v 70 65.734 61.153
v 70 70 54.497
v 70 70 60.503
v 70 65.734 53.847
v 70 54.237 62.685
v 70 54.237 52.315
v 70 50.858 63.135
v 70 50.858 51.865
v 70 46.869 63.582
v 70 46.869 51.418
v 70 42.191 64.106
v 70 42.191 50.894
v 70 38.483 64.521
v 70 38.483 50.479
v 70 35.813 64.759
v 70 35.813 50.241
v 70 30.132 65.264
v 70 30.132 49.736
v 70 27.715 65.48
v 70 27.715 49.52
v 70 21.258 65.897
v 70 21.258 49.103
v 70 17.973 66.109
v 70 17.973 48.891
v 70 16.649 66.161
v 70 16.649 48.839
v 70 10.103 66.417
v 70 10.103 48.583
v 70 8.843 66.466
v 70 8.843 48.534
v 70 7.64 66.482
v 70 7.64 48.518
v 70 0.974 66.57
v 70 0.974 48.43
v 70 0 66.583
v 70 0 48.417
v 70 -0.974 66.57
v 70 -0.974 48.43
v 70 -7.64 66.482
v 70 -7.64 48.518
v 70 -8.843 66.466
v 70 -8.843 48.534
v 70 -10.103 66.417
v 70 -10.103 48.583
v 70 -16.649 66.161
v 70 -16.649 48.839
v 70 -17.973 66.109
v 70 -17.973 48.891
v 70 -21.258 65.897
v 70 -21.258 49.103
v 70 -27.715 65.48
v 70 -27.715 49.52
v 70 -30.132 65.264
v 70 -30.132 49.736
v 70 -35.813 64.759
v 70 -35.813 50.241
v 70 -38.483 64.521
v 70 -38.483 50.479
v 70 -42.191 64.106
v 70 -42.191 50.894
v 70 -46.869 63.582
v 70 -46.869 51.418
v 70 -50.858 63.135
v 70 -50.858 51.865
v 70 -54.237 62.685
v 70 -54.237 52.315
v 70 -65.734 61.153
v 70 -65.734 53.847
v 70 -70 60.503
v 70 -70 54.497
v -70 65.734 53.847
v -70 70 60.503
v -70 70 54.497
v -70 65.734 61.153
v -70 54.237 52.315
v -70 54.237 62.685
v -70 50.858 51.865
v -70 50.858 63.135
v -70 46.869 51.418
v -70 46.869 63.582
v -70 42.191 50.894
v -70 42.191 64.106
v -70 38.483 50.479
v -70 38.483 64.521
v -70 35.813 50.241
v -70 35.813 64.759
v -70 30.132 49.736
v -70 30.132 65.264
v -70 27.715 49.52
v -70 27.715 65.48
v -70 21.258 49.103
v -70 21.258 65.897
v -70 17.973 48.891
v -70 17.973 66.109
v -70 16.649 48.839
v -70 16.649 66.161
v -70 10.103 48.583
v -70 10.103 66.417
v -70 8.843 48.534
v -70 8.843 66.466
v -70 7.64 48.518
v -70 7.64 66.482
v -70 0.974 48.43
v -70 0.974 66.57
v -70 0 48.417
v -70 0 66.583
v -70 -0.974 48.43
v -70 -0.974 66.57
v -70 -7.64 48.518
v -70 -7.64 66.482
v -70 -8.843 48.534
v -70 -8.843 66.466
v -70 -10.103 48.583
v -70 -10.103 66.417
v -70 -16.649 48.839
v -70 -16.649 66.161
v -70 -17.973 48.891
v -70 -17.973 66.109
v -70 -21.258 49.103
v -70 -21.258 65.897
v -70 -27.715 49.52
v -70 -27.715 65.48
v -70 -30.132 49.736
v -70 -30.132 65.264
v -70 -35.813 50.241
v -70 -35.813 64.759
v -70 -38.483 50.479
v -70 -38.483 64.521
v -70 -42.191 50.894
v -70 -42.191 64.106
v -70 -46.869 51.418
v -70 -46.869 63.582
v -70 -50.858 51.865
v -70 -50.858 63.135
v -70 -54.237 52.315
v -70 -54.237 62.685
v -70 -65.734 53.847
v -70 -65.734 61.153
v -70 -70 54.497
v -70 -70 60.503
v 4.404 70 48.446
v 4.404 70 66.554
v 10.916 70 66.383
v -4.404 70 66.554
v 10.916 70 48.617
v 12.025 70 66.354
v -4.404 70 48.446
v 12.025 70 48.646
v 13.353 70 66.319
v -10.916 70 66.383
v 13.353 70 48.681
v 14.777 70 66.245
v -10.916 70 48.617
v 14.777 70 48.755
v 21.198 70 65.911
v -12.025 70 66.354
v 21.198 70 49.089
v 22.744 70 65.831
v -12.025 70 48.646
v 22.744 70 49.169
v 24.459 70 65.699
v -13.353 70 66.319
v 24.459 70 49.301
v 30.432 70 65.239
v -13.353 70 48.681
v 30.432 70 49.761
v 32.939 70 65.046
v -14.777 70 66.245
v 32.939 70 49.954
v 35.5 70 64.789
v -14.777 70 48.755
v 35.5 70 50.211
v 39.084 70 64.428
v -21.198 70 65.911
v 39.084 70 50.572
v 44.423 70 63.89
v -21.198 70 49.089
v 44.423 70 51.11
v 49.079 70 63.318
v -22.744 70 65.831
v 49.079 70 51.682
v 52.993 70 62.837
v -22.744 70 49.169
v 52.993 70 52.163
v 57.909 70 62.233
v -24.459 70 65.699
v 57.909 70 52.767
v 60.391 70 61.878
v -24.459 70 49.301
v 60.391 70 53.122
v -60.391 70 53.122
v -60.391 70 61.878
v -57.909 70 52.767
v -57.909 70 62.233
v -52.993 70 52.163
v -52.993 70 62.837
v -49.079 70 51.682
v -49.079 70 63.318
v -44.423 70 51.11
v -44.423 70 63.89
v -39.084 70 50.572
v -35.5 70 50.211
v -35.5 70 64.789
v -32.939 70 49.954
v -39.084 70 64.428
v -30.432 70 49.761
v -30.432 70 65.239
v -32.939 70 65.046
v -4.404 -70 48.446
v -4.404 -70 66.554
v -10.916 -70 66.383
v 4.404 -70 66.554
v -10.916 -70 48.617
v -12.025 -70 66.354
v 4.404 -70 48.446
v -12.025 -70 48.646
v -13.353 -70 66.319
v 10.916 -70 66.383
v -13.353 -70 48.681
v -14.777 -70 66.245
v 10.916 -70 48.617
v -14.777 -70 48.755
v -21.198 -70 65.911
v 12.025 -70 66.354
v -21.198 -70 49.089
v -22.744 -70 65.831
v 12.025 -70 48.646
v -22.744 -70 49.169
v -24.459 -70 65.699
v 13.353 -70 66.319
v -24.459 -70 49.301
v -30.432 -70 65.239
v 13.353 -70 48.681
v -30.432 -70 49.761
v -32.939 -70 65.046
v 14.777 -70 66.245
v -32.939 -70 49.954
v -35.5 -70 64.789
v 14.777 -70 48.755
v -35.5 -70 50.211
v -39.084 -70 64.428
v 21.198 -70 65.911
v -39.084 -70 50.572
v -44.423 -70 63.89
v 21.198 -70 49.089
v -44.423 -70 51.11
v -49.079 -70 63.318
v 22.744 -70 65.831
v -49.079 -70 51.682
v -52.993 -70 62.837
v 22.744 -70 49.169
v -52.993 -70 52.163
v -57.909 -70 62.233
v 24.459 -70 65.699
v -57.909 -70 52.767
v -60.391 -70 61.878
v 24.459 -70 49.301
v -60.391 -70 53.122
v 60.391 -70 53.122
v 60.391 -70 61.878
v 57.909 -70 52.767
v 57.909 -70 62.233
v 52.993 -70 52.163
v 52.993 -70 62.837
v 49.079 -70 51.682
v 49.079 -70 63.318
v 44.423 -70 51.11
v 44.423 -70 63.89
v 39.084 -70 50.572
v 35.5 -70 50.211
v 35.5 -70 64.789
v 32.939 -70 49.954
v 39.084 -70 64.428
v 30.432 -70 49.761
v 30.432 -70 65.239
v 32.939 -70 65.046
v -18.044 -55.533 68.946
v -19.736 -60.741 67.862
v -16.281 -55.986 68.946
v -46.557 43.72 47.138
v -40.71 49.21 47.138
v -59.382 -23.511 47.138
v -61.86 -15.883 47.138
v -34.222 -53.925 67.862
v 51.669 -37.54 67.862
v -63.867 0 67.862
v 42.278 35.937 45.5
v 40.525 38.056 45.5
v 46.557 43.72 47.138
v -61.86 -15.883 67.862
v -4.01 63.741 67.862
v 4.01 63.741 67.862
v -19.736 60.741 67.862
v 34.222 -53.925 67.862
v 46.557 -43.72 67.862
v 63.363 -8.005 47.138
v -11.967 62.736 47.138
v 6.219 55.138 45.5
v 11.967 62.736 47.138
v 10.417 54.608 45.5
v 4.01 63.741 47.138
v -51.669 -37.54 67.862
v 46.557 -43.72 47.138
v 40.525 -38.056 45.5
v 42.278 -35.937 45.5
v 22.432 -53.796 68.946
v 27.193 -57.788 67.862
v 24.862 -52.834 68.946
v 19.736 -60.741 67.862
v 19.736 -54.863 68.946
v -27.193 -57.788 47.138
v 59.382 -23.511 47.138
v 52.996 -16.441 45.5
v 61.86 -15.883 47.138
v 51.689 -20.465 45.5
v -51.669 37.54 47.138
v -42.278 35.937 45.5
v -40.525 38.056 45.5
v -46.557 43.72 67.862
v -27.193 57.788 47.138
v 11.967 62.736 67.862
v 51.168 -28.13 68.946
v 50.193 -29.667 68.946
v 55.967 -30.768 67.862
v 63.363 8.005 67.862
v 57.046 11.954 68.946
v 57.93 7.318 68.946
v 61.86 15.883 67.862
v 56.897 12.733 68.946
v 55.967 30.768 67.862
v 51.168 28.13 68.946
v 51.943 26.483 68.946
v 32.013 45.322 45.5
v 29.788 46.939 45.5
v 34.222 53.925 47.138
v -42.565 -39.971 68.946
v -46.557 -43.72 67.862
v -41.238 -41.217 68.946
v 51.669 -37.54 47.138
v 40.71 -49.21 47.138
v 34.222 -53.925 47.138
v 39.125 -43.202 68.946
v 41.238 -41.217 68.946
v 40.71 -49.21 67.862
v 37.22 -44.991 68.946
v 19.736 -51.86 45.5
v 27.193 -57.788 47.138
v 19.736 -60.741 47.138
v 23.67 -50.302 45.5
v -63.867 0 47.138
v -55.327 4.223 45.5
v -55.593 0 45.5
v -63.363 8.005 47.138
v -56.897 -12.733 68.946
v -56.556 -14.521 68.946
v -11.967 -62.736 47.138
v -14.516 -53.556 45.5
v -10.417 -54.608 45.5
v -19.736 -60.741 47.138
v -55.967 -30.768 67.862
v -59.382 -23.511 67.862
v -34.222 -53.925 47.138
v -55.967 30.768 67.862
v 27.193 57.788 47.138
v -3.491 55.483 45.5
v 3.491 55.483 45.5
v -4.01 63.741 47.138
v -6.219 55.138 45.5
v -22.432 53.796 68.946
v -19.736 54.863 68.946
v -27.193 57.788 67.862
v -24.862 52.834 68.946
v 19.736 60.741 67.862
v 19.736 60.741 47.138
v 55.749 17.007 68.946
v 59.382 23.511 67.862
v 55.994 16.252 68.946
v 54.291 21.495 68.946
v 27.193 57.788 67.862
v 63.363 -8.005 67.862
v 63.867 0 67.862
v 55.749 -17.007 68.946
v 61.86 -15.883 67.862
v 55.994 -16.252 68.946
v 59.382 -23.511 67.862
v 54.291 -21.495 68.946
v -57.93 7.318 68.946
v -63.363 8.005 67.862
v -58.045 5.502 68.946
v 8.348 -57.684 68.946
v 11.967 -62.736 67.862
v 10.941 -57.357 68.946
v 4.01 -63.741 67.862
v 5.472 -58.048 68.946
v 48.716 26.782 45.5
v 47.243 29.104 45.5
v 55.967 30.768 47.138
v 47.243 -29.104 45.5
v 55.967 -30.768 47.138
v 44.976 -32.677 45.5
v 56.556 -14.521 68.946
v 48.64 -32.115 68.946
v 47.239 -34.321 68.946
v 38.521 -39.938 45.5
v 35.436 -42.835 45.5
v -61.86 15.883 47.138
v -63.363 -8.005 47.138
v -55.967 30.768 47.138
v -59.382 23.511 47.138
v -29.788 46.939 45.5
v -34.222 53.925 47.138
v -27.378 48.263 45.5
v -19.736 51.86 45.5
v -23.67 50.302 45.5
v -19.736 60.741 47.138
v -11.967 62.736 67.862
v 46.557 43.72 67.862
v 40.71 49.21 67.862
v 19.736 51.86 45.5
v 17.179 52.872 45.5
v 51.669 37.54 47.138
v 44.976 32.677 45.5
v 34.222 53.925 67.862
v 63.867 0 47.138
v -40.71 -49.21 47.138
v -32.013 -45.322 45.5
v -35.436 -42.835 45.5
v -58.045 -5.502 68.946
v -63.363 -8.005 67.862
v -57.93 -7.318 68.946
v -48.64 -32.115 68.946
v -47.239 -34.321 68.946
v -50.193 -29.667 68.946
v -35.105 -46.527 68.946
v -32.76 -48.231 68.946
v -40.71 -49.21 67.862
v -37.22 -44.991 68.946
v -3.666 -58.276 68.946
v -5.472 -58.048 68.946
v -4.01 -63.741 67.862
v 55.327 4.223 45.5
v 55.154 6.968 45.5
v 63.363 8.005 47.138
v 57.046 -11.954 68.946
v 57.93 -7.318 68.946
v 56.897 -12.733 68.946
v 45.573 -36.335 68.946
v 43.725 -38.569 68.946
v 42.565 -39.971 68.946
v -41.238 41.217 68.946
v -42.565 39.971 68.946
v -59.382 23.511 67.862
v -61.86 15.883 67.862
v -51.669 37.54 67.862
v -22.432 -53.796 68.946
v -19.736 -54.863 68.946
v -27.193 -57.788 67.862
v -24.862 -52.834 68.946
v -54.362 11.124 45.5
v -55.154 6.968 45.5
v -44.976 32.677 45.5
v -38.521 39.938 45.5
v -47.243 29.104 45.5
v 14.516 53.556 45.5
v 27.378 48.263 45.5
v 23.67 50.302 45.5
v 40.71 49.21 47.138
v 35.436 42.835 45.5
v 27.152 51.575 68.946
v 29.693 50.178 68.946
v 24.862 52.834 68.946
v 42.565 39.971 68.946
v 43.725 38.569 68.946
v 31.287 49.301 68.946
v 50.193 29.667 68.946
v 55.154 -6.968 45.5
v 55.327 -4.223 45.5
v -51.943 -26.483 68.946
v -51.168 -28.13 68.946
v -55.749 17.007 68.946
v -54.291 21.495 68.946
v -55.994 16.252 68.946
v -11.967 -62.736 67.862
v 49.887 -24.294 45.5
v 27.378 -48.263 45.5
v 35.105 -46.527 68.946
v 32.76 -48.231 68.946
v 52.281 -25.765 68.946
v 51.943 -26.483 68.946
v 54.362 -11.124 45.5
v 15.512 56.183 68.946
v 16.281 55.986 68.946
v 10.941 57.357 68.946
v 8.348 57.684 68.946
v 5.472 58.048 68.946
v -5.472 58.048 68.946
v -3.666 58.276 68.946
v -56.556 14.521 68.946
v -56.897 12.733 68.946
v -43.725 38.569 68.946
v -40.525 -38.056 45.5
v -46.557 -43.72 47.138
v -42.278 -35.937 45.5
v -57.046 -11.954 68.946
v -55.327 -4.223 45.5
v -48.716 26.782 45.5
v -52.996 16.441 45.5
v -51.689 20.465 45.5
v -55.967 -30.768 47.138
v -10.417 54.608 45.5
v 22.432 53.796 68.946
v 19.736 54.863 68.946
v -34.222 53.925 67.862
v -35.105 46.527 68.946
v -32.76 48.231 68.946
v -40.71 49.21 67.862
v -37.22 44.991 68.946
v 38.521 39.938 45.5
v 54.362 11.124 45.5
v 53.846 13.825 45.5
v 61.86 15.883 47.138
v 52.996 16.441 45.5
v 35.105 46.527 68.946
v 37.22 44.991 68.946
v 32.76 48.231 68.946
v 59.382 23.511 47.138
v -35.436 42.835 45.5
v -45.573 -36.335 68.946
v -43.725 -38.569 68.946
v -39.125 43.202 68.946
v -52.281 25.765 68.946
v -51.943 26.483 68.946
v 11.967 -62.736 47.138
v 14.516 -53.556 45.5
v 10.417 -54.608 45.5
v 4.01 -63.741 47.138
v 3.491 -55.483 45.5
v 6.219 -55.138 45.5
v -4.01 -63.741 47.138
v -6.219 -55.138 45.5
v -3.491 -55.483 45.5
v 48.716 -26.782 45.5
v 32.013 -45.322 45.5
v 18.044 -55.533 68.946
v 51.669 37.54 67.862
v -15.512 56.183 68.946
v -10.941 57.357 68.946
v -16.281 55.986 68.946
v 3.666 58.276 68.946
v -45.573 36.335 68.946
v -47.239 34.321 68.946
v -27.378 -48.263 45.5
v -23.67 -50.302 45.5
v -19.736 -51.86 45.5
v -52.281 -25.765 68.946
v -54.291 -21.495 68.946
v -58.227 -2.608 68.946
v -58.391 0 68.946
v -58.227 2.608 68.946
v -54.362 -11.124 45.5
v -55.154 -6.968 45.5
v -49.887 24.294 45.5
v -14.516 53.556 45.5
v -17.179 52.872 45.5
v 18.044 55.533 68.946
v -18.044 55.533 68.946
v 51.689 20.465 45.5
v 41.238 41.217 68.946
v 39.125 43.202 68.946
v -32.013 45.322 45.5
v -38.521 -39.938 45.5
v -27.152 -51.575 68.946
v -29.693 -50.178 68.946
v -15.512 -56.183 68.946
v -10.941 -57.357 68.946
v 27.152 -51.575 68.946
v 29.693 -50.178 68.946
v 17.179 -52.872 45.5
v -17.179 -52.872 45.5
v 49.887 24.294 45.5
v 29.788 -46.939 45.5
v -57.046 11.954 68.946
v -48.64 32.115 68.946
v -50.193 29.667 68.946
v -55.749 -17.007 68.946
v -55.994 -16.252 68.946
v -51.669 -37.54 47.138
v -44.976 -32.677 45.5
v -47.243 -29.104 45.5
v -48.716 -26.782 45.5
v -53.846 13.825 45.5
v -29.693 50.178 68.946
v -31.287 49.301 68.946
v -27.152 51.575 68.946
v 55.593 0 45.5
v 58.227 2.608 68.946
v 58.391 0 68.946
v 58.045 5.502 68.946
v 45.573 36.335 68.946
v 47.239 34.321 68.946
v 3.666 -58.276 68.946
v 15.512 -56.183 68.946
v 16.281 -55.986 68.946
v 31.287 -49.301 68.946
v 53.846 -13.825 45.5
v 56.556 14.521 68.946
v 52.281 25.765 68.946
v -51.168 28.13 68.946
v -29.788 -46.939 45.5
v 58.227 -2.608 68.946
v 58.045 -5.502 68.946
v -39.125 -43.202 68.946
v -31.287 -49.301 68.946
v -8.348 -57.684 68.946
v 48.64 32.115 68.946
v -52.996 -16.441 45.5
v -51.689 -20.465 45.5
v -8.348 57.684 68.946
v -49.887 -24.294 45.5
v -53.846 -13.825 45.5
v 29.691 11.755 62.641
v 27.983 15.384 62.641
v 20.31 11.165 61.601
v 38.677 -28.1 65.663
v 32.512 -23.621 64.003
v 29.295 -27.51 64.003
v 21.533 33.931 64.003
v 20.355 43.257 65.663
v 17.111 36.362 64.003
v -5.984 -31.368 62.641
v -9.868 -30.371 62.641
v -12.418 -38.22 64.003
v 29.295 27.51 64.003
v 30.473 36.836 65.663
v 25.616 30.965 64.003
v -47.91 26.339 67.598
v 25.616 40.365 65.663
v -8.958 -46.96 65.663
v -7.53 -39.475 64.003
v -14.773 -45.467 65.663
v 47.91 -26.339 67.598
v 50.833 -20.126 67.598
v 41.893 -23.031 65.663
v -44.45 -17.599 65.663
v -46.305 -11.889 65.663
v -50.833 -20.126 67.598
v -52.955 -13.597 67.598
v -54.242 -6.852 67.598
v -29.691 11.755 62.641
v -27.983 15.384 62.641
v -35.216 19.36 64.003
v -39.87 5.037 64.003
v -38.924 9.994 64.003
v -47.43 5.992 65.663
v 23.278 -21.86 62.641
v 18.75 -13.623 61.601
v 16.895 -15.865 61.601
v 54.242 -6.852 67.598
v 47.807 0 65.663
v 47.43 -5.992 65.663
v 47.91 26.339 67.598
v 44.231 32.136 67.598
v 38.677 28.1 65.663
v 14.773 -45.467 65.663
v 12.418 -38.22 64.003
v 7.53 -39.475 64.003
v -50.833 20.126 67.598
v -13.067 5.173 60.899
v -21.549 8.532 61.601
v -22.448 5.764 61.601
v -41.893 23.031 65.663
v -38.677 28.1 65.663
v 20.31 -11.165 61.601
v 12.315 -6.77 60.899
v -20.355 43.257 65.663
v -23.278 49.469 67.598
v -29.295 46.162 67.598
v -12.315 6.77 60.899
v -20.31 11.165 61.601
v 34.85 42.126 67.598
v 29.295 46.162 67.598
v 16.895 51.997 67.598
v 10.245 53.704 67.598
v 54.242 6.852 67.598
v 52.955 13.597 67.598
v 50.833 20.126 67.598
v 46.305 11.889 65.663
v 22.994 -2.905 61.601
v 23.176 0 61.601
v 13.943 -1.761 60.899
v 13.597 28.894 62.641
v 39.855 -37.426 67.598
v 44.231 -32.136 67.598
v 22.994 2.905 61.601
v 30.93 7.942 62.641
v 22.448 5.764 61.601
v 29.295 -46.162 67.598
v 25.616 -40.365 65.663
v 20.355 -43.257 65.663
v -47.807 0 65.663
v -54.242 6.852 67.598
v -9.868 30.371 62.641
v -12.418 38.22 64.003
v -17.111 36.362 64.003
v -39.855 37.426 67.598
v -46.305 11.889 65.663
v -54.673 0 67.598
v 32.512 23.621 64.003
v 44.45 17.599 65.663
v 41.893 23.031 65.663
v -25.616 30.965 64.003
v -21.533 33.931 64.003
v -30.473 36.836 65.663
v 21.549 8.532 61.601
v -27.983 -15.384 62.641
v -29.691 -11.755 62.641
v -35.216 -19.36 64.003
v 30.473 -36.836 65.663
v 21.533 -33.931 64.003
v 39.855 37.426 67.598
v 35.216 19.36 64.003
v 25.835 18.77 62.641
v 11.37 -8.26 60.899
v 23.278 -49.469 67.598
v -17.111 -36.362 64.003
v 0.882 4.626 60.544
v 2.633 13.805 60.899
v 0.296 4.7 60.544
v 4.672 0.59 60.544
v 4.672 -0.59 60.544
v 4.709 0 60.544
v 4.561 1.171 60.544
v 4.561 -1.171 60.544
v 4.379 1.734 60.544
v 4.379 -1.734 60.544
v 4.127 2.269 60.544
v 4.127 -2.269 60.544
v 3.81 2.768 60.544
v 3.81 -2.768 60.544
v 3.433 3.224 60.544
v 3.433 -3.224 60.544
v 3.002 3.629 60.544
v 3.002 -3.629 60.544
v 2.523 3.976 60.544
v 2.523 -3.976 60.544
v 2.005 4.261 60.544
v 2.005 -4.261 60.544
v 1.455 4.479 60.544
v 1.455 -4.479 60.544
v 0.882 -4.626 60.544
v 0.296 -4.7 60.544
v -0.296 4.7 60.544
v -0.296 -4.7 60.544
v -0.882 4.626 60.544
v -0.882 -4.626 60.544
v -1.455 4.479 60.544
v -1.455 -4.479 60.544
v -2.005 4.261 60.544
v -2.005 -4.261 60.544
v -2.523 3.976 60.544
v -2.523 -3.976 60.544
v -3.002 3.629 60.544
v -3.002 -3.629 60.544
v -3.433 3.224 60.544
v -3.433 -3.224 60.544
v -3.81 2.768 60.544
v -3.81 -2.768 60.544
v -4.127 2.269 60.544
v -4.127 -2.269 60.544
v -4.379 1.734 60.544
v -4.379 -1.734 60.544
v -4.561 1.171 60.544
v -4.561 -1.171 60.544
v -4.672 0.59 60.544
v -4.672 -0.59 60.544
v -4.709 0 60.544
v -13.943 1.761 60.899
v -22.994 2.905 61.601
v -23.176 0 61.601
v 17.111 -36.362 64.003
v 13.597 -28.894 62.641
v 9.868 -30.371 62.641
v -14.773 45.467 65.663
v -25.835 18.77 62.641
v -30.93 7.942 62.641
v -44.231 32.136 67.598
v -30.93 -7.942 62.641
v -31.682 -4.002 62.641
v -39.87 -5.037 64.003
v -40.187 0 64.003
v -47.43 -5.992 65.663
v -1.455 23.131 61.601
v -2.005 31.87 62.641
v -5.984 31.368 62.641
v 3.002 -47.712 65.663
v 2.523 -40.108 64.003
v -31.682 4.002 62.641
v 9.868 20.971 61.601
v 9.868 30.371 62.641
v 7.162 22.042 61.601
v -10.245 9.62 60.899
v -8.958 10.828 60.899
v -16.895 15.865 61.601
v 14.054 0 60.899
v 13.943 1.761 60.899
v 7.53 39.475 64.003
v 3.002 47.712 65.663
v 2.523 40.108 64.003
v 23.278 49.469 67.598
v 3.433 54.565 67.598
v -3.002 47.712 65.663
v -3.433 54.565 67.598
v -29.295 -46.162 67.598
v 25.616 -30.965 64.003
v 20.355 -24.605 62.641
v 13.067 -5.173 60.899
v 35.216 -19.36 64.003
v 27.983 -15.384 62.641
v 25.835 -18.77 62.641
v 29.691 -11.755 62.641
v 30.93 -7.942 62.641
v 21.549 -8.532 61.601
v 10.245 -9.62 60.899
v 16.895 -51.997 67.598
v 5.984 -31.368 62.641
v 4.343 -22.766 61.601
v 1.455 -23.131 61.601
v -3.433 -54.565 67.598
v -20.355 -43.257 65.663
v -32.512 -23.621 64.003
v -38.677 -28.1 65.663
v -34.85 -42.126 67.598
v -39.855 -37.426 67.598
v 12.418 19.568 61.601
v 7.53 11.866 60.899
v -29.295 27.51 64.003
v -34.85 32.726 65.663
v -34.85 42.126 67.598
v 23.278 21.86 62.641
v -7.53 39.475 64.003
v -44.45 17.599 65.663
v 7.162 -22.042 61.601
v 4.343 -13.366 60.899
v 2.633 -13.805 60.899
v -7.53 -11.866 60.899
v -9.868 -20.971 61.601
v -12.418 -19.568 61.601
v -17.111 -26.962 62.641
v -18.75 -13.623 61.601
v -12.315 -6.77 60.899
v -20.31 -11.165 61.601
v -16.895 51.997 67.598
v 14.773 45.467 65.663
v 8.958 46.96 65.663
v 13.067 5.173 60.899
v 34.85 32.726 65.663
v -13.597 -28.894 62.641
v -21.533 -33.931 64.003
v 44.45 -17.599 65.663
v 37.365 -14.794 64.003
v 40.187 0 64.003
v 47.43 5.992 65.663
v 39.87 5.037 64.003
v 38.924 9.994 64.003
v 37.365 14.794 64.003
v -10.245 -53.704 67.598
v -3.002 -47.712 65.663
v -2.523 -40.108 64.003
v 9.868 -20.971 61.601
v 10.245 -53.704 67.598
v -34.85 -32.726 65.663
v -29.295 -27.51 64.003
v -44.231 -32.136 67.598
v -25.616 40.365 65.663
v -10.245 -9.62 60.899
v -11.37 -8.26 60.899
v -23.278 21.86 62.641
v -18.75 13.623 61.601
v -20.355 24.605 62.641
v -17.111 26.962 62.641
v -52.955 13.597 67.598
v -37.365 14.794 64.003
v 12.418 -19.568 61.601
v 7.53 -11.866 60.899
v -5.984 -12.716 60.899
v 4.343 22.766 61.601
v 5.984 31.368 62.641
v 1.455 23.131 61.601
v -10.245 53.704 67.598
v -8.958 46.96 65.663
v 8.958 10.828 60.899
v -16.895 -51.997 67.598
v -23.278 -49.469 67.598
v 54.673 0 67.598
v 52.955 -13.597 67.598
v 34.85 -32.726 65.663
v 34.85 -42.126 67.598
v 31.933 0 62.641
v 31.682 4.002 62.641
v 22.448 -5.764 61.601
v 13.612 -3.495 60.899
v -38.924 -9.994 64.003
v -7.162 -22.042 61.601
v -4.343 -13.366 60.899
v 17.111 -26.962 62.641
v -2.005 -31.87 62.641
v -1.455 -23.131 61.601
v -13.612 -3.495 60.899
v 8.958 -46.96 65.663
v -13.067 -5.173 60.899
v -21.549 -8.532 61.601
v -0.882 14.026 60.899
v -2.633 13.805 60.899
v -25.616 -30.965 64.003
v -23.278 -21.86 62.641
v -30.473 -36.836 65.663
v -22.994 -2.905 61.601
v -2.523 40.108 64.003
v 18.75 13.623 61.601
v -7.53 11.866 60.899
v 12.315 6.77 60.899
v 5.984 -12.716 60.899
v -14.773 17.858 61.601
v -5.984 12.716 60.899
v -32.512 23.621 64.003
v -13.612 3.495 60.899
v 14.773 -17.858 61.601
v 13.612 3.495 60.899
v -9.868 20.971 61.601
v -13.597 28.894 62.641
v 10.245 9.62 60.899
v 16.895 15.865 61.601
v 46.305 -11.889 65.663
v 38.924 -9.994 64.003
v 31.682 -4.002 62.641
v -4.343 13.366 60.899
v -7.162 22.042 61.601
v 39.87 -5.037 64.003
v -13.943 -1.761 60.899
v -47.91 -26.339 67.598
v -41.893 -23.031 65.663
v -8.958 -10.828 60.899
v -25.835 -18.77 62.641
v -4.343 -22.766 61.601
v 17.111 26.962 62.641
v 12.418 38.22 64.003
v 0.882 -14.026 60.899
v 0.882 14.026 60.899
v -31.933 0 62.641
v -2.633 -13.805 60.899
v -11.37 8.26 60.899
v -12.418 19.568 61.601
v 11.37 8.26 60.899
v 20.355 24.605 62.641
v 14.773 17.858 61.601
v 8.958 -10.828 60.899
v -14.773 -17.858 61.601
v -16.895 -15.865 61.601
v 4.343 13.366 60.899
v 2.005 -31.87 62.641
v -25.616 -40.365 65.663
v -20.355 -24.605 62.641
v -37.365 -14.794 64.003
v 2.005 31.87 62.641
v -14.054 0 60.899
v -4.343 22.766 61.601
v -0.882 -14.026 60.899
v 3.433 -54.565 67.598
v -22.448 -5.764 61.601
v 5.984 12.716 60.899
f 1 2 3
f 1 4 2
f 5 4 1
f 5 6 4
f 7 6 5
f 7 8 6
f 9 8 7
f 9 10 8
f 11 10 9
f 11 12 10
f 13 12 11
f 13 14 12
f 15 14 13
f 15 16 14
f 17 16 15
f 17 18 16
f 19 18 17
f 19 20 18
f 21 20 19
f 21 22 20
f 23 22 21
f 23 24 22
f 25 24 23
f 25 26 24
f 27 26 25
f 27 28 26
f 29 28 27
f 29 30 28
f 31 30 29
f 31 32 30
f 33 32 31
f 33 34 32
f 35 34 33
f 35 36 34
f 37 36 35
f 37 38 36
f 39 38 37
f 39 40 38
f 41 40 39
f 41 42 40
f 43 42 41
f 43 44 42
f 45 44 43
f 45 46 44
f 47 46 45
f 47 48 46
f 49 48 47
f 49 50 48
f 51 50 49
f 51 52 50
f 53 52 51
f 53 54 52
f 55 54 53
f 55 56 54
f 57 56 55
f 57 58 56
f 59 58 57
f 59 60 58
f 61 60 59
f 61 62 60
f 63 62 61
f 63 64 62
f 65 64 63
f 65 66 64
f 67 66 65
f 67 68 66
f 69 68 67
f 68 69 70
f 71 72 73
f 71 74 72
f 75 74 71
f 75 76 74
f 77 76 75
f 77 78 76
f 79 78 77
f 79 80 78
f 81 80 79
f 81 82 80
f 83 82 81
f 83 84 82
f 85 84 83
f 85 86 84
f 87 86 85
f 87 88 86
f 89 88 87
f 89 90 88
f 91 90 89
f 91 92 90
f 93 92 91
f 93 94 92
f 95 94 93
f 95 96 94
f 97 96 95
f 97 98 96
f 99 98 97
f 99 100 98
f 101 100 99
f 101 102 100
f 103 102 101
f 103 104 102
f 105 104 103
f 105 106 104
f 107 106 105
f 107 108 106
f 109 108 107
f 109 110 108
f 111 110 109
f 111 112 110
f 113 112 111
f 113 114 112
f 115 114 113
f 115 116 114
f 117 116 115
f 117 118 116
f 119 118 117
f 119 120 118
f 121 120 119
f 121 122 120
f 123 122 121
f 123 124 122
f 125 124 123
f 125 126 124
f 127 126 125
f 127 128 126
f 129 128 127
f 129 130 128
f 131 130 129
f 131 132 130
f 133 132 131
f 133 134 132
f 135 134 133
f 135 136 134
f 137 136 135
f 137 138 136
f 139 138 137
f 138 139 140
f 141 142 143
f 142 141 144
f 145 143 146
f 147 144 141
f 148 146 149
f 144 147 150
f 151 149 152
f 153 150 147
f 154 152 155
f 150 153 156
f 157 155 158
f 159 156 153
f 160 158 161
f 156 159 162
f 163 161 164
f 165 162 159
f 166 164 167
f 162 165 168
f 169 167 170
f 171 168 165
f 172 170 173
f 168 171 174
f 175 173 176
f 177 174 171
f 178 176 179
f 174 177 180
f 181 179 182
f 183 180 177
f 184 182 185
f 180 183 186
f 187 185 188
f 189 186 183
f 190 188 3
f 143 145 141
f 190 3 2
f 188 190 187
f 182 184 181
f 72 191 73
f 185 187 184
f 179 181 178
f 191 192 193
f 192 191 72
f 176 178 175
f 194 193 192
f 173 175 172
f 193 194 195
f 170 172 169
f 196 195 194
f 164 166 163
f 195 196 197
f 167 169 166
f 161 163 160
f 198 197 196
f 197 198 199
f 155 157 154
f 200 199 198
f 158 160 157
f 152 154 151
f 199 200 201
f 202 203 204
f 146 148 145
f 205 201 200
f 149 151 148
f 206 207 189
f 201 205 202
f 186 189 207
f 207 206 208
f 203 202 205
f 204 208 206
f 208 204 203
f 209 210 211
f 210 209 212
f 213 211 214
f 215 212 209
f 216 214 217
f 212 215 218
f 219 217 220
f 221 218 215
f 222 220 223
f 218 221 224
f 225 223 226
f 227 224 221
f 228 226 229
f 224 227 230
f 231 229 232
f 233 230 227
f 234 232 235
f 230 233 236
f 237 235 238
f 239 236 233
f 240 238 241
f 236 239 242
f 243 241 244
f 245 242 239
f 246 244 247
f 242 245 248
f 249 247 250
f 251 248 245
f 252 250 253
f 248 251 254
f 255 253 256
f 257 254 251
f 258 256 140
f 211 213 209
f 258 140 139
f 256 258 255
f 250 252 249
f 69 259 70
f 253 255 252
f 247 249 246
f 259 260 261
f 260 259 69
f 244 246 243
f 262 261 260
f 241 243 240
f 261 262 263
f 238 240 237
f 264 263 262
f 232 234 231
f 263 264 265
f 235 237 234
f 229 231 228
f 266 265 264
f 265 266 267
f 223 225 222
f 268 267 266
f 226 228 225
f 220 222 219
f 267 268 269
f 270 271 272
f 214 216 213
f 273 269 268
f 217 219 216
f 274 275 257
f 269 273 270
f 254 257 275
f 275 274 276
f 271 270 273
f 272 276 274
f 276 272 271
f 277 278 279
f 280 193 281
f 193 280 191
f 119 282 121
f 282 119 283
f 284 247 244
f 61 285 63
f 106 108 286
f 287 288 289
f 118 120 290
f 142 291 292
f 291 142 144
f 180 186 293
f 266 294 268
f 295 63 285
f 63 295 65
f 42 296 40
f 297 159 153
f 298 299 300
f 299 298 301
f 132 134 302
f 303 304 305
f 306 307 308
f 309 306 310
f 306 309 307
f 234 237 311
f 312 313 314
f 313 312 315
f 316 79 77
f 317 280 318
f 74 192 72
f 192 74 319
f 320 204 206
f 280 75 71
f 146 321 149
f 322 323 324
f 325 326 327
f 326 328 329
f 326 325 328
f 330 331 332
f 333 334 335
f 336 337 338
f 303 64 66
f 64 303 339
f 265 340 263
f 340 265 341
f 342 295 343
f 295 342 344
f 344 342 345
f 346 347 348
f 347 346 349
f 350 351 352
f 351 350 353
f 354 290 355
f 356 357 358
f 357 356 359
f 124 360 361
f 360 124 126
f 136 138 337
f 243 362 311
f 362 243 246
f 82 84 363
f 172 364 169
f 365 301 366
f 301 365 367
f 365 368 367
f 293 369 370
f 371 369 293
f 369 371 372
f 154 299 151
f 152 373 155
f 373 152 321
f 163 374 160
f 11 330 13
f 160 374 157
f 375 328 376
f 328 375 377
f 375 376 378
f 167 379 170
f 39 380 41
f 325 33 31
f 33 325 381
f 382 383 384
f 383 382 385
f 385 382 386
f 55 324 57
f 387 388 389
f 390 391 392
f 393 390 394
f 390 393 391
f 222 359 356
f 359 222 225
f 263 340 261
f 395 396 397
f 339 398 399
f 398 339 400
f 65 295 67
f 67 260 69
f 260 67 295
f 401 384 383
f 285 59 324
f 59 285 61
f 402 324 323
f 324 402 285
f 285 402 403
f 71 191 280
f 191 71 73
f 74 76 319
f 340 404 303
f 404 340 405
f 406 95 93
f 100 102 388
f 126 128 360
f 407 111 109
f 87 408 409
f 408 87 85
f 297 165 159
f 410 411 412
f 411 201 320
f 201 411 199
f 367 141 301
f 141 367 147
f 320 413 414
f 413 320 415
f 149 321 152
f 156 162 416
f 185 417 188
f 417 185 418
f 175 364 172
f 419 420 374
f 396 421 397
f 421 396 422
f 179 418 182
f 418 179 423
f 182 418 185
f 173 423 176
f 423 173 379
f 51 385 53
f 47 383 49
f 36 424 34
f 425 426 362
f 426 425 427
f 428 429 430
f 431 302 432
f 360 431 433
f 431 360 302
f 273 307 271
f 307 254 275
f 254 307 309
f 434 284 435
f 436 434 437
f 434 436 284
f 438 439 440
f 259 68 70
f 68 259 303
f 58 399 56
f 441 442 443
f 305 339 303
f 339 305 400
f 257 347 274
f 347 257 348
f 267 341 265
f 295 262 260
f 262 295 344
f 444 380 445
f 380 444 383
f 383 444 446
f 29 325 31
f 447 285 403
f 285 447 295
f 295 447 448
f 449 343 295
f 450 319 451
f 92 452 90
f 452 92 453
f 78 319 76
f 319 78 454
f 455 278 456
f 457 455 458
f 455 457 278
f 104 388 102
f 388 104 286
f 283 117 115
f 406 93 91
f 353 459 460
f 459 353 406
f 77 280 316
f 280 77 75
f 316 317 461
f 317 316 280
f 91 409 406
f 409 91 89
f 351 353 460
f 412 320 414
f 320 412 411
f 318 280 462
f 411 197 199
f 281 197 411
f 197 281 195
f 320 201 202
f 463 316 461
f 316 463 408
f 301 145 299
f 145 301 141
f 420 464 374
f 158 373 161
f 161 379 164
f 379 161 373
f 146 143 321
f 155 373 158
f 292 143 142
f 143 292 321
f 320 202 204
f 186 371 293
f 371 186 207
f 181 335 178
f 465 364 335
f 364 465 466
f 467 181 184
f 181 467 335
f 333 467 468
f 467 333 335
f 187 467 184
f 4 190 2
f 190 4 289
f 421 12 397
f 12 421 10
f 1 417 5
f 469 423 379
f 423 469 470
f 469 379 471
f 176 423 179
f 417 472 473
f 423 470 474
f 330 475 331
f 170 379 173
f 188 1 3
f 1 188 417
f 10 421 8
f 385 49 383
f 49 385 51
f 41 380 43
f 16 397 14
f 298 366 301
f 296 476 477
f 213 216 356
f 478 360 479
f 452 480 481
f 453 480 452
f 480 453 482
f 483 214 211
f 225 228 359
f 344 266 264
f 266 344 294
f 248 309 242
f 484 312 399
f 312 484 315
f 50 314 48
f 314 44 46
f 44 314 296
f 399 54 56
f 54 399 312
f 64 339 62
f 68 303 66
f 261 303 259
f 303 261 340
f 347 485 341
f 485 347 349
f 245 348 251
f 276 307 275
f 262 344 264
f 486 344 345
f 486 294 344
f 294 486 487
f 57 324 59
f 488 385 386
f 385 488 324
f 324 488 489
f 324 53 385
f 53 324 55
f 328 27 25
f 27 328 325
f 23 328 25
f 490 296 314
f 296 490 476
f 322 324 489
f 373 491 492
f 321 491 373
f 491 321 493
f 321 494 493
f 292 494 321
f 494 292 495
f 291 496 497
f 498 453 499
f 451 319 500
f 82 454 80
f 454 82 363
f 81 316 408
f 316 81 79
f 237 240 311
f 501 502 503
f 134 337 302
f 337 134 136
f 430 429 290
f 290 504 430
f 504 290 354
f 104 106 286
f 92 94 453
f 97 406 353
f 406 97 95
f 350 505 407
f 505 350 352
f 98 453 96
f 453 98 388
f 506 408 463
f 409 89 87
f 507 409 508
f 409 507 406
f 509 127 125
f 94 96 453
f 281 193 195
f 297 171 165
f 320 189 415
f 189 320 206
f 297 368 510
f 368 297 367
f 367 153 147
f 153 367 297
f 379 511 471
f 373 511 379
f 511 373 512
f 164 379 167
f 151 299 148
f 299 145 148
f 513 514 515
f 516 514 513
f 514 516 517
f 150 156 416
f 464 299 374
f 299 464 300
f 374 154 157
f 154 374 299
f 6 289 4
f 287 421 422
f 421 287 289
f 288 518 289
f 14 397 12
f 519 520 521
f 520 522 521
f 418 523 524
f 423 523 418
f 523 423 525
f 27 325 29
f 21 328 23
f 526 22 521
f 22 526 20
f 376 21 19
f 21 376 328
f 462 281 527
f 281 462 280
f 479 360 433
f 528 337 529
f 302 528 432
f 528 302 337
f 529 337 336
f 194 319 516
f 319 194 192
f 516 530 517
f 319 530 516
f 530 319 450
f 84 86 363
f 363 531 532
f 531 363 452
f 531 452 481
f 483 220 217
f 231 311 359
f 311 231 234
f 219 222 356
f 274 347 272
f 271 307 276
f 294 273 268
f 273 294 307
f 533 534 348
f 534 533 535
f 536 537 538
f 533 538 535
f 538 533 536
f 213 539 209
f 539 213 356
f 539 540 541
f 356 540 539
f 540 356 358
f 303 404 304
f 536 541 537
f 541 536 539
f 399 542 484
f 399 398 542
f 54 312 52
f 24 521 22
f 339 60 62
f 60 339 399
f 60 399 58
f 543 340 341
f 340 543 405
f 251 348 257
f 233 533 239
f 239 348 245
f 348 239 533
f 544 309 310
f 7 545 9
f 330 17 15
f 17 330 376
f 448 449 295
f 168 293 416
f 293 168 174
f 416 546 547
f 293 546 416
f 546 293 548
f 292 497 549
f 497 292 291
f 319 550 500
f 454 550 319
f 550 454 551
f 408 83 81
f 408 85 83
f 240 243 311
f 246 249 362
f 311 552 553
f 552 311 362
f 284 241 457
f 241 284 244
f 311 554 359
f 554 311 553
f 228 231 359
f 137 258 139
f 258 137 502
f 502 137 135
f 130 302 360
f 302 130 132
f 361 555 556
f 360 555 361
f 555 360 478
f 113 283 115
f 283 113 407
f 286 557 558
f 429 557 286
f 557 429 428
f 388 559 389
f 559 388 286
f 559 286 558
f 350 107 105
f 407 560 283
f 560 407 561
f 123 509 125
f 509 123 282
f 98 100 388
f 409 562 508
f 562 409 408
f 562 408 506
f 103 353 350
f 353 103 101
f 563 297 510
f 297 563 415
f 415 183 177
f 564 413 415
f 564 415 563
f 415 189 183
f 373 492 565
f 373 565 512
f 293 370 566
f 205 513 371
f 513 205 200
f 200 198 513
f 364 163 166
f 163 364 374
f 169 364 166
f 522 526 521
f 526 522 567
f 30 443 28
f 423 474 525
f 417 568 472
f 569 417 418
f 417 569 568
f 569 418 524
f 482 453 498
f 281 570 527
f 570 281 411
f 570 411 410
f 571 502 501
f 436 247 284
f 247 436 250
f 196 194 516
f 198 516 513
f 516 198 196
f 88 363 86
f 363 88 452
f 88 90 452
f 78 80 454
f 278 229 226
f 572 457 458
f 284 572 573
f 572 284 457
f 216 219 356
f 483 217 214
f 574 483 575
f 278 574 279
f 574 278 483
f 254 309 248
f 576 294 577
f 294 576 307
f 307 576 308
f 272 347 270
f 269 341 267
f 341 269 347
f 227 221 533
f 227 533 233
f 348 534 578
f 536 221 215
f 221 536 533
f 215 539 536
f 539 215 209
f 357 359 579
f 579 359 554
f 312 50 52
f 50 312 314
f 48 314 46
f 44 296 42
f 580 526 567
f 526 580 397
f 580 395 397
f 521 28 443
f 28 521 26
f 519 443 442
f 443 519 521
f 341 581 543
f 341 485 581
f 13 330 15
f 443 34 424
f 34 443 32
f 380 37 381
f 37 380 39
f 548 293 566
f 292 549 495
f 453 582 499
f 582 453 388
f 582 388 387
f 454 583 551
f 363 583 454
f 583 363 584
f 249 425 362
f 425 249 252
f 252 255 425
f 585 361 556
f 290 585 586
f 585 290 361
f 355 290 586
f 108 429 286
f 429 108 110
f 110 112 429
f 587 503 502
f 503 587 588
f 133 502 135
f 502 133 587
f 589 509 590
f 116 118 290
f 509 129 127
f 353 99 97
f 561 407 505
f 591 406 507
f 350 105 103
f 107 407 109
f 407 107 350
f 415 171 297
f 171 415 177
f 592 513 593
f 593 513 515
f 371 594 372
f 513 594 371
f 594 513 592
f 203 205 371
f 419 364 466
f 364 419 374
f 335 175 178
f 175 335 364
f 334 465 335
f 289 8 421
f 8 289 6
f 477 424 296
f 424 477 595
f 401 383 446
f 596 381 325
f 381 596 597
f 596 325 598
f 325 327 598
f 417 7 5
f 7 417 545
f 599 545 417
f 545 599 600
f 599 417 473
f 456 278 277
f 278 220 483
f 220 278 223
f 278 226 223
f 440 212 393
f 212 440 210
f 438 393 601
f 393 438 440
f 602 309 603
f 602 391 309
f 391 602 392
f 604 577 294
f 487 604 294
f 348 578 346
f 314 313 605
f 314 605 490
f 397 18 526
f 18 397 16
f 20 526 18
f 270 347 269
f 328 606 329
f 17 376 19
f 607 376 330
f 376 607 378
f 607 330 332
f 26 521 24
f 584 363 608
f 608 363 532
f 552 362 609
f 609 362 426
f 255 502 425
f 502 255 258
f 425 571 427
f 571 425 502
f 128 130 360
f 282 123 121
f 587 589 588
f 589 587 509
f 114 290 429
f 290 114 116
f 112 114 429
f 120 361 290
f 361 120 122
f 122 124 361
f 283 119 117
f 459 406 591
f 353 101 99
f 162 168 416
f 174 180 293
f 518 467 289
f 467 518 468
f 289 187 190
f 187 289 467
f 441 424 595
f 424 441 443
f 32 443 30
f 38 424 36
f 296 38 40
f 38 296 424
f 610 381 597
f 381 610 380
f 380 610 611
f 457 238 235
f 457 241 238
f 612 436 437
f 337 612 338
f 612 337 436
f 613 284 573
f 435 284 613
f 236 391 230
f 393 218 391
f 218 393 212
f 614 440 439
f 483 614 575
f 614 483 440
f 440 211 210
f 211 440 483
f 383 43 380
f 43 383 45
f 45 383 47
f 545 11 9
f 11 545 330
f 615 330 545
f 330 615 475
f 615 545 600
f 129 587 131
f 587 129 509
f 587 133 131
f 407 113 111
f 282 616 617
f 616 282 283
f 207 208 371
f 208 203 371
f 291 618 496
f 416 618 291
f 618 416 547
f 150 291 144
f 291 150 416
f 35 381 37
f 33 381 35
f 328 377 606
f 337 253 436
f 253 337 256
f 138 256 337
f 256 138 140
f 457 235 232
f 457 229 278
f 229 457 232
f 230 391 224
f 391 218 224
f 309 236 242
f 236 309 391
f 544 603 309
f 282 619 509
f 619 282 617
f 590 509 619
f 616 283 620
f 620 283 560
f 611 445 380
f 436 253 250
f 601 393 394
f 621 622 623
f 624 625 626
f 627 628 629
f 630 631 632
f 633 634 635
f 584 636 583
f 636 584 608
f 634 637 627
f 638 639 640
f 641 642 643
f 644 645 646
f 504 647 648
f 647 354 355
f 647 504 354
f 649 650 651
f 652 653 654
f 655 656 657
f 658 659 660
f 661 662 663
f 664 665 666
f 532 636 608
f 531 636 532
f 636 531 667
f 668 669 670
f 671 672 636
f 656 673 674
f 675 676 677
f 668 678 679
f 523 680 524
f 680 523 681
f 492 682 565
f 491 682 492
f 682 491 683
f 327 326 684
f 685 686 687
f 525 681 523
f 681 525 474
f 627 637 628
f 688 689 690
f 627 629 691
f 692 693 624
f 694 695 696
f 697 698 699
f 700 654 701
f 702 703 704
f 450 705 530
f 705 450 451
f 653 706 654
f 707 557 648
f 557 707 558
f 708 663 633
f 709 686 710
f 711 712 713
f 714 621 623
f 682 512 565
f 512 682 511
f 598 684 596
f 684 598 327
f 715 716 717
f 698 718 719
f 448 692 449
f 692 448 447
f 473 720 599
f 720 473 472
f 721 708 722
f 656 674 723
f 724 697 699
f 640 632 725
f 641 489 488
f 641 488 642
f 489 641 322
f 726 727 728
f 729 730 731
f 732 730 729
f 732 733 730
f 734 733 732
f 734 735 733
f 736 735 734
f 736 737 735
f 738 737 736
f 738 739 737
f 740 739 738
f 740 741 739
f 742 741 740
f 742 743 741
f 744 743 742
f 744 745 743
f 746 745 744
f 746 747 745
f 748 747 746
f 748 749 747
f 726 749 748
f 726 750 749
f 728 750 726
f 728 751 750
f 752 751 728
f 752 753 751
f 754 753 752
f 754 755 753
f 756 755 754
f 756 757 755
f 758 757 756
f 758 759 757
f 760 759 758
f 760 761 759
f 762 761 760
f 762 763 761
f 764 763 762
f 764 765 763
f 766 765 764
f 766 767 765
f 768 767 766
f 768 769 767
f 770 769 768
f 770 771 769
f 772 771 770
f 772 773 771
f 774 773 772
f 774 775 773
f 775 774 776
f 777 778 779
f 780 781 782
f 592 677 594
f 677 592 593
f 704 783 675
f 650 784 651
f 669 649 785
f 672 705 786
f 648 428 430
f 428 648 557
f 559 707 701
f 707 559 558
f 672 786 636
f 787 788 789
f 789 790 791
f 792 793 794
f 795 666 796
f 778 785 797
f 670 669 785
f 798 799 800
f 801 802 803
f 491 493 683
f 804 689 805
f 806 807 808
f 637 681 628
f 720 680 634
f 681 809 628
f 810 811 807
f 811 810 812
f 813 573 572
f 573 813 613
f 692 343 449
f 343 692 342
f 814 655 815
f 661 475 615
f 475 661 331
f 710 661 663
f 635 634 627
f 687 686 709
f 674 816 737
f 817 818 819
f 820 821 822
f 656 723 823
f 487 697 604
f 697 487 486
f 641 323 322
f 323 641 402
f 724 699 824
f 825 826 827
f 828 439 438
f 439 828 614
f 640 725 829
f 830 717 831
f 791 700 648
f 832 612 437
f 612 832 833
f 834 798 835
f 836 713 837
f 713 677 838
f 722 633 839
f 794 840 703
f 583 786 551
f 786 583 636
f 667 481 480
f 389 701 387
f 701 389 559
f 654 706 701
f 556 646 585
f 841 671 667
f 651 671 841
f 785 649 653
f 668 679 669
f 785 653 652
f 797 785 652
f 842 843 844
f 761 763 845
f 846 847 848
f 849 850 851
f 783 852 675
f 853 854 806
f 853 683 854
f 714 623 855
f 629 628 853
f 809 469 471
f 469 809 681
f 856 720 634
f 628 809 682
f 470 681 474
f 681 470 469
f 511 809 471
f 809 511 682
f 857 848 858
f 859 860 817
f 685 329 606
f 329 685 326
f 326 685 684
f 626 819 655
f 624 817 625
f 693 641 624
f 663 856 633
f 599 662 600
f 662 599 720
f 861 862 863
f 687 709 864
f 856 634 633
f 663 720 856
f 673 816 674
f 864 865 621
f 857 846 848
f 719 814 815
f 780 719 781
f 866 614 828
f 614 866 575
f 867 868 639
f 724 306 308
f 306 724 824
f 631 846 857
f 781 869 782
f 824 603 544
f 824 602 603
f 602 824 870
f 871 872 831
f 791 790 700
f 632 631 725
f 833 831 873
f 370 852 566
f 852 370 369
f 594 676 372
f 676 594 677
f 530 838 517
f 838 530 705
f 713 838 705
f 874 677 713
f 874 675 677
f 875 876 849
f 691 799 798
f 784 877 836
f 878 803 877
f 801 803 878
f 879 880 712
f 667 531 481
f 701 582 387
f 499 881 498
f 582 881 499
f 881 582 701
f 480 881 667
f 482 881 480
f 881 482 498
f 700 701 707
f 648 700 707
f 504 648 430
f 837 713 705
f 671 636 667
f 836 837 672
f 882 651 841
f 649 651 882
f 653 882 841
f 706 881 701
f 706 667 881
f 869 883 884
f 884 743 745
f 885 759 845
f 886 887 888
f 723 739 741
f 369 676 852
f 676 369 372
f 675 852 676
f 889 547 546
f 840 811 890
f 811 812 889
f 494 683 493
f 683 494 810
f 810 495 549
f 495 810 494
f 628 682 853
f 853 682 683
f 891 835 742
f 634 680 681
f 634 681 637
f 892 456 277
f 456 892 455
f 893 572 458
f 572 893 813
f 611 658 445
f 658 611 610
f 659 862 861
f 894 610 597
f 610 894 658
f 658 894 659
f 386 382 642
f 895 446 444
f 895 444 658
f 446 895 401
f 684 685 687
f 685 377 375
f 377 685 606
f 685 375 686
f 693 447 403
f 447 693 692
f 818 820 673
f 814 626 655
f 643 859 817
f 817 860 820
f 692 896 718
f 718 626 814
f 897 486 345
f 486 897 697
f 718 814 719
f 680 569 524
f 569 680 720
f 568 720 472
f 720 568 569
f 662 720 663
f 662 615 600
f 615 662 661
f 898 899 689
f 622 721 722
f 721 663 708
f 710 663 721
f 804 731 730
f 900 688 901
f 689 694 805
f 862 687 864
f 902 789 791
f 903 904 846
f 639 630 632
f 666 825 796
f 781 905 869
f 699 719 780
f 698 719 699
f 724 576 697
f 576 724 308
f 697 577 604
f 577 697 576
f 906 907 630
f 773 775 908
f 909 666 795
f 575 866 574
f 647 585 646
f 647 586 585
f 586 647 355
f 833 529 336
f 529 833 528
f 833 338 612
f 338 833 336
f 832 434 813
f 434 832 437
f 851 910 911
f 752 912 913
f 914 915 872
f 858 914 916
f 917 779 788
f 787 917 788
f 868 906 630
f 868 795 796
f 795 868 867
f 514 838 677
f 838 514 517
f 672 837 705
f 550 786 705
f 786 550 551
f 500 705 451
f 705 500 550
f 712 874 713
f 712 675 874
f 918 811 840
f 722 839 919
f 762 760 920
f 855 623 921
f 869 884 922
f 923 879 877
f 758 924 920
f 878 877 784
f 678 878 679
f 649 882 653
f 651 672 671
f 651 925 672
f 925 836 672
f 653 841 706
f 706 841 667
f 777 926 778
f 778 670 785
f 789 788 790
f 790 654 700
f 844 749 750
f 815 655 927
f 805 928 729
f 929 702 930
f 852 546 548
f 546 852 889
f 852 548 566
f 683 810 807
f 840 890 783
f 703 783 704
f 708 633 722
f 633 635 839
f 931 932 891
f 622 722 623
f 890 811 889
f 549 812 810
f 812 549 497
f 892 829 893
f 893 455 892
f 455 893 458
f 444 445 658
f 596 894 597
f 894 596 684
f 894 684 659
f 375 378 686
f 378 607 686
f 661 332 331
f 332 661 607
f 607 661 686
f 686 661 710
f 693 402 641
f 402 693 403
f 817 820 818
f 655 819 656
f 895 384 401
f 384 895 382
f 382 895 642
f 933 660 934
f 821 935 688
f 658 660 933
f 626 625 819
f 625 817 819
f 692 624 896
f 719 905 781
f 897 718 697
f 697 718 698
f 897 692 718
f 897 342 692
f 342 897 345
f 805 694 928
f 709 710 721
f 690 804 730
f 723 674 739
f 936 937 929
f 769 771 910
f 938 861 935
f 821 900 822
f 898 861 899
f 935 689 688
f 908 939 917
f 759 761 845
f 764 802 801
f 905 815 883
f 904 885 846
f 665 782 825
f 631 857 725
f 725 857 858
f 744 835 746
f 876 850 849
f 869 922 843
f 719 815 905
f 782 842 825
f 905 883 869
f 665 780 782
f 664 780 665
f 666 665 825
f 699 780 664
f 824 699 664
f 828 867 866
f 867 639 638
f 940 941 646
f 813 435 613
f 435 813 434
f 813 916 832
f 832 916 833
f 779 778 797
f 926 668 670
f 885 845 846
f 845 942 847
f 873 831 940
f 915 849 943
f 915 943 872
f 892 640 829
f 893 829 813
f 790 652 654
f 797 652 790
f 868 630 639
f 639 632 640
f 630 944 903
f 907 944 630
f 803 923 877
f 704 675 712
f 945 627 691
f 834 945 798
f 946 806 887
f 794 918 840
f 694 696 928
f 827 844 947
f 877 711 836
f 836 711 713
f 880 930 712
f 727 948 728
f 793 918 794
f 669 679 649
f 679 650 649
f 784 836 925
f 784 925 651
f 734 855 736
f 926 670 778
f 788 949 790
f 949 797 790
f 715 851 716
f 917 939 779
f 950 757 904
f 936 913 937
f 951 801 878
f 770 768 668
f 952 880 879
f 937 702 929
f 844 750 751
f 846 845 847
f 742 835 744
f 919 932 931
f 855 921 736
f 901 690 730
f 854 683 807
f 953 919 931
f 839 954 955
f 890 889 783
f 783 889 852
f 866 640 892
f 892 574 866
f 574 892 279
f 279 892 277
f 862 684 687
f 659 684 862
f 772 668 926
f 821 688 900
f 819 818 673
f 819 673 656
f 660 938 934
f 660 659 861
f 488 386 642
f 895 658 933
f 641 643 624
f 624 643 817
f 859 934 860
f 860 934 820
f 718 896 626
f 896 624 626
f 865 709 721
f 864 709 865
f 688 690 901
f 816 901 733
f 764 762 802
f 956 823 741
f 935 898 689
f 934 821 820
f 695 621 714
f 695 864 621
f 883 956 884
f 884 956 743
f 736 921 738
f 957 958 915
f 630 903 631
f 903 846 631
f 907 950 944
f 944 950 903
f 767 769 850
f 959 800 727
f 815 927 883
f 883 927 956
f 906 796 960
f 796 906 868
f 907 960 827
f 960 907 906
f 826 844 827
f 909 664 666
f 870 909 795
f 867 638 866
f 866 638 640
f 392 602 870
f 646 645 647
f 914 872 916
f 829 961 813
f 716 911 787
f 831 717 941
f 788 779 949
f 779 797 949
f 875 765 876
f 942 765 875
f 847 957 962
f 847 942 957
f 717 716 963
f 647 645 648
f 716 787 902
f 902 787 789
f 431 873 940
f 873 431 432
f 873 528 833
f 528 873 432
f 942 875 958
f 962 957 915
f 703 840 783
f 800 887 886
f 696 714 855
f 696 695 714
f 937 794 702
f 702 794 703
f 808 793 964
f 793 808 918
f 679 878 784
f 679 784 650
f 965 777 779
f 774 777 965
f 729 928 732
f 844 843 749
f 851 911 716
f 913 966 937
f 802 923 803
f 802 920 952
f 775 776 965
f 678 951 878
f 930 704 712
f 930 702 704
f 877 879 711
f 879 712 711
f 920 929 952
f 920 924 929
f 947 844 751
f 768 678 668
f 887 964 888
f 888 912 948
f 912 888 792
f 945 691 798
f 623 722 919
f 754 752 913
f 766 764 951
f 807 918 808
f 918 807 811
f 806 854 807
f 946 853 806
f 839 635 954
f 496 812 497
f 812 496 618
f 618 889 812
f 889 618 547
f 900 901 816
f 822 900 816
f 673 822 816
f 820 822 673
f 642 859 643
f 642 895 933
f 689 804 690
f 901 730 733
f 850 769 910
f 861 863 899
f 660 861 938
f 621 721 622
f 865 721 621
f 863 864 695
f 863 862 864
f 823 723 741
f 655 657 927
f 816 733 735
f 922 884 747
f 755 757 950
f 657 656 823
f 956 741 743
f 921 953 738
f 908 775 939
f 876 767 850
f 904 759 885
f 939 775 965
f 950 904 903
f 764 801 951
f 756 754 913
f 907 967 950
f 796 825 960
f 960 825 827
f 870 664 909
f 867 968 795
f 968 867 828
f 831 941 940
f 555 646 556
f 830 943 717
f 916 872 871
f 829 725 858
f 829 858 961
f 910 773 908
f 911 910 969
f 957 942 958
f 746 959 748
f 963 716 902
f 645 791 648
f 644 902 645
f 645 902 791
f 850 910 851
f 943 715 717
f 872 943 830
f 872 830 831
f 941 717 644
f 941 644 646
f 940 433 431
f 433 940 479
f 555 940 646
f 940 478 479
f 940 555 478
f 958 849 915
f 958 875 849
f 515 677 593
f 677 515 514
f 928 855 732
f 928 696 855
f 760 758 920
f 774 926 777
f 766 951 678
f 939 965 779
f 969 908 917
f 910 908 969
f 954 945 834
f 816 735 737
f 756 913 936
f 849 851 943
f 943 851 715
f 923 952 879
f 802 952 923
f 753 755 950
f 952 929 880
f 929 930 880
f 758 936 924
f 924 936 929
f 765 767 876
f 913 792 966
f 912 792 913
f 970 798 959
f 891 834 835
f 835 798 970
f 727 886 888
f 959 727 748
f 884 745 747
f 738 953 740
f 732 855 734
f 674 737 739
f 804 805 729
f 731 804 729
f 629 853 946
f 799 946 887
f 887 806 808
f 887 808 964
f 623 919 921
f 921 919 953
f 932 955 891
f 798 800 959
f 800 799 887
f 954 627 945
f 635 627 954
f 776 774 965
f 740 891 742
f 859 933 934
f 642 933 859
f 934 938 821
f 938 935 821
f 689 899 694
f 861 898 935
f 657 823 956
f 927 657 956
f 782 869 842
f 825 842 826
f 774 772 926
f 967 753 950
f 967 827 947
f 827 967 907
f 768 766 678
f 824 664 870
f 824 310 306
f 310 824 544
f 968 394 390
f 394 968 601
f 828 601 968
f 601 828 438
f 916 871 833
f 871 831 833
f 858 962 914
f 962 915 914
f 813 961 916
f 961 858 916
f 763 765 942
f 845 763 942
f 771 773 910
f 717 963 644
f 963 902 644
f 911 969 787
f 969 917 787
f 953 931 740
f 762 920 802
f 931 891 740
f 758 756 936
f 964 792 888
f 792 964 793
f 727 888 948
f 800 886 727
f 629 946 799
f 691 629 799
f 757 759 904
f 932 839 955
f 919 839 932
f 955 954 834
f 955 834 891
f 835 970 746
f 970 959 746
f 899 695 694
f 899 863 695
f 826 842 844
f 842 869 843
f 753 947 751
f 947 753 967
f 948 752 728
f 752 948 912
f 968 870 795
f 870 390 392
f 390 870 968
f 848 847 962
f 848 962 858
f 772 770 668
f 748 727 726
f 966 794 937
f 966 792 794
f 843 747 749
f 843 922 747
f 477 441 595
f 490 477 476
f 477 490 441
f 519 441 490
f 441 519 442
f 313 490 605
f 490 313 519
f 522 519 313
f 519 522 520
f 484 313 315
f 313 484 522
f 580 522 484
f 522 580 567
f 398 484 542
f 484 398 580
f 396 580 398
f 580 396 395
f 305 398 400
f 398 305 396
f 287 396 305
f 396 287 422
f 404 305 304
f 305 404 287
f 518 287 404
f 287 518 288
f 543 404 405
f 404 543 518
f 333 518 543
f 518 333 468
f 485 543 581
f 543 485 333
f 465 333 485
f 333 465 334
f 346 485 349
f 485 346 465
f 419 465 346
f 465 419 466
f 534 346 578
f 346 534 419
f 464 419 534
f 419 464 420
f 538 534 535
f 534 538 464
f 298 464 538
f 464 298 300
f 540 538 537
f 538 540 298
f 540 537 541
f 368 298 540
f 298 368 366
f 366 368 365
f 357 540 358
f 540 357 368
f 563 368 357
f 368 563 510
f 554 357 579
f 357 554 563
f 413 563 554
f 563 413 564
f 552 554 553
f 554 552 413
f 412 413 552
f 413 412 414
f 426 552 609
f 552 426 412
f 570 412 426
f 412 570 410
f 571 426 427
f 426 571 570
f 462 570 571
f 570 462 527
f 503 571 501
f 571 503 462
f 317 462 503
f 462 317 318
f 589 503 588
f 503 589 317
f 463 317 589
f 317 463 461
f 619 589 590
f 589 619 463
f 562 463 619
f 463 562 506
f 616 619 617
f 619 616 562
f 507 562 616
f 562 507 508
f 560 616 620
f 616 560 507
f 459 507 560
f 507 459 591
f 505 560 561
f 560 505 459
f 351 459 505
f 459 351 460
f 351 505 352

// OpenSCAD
/* SPILIS LATHE BOWL
design by Daniel Spielmann, May 2015
//_________________________________
sorry, no cleanup, just changed for Customizer, May 2017
*/

// Scale X
scale_x = 2;
// Scale Y
scale_y = 2;
// Scale Z
scale_z = 1;


calotradius = 750; //[700:800]

/* [Hidden] */ 
cr = calotradius; 		

xscale = scale_x/10;
yscale = scale_y/10;
zscale = scale_z/10;

translate ([0,0,0])
bowl();


module bowl() {

scale([xscale,yscale,zscale]) {



difference()	{
difference()	{
	difference()	{
	calots();
	frame();
		}
	translate ([0,0,cr+80]) 
	scale([1,1,0.6])
	sphere((cr/2), $fn=50); 
}
translate ([0,0,80])
cube(size = [cr*2,cr*2,cr], center = true);
}
}
}

module calot() {
difference()	{
sphere(cr, $fn=50); 
translate ([0,0,-cr+550])
cube(size = [cr*2,cr*2,cr*2], center = true);
}
}

module calots() {
hull() {
calot();
translate ([0,0,cr*2-350])
mirror([0,0,1]) calot();
 }
}

module frame() {
difference()	{
translate ([0,0,cr/2])
cube(size = [cr*2,cr*2,1000], center = true);
translate ([0,0,cr/2])
cube(size = [cr-50,cr-50,1000], center = true);
}
}
